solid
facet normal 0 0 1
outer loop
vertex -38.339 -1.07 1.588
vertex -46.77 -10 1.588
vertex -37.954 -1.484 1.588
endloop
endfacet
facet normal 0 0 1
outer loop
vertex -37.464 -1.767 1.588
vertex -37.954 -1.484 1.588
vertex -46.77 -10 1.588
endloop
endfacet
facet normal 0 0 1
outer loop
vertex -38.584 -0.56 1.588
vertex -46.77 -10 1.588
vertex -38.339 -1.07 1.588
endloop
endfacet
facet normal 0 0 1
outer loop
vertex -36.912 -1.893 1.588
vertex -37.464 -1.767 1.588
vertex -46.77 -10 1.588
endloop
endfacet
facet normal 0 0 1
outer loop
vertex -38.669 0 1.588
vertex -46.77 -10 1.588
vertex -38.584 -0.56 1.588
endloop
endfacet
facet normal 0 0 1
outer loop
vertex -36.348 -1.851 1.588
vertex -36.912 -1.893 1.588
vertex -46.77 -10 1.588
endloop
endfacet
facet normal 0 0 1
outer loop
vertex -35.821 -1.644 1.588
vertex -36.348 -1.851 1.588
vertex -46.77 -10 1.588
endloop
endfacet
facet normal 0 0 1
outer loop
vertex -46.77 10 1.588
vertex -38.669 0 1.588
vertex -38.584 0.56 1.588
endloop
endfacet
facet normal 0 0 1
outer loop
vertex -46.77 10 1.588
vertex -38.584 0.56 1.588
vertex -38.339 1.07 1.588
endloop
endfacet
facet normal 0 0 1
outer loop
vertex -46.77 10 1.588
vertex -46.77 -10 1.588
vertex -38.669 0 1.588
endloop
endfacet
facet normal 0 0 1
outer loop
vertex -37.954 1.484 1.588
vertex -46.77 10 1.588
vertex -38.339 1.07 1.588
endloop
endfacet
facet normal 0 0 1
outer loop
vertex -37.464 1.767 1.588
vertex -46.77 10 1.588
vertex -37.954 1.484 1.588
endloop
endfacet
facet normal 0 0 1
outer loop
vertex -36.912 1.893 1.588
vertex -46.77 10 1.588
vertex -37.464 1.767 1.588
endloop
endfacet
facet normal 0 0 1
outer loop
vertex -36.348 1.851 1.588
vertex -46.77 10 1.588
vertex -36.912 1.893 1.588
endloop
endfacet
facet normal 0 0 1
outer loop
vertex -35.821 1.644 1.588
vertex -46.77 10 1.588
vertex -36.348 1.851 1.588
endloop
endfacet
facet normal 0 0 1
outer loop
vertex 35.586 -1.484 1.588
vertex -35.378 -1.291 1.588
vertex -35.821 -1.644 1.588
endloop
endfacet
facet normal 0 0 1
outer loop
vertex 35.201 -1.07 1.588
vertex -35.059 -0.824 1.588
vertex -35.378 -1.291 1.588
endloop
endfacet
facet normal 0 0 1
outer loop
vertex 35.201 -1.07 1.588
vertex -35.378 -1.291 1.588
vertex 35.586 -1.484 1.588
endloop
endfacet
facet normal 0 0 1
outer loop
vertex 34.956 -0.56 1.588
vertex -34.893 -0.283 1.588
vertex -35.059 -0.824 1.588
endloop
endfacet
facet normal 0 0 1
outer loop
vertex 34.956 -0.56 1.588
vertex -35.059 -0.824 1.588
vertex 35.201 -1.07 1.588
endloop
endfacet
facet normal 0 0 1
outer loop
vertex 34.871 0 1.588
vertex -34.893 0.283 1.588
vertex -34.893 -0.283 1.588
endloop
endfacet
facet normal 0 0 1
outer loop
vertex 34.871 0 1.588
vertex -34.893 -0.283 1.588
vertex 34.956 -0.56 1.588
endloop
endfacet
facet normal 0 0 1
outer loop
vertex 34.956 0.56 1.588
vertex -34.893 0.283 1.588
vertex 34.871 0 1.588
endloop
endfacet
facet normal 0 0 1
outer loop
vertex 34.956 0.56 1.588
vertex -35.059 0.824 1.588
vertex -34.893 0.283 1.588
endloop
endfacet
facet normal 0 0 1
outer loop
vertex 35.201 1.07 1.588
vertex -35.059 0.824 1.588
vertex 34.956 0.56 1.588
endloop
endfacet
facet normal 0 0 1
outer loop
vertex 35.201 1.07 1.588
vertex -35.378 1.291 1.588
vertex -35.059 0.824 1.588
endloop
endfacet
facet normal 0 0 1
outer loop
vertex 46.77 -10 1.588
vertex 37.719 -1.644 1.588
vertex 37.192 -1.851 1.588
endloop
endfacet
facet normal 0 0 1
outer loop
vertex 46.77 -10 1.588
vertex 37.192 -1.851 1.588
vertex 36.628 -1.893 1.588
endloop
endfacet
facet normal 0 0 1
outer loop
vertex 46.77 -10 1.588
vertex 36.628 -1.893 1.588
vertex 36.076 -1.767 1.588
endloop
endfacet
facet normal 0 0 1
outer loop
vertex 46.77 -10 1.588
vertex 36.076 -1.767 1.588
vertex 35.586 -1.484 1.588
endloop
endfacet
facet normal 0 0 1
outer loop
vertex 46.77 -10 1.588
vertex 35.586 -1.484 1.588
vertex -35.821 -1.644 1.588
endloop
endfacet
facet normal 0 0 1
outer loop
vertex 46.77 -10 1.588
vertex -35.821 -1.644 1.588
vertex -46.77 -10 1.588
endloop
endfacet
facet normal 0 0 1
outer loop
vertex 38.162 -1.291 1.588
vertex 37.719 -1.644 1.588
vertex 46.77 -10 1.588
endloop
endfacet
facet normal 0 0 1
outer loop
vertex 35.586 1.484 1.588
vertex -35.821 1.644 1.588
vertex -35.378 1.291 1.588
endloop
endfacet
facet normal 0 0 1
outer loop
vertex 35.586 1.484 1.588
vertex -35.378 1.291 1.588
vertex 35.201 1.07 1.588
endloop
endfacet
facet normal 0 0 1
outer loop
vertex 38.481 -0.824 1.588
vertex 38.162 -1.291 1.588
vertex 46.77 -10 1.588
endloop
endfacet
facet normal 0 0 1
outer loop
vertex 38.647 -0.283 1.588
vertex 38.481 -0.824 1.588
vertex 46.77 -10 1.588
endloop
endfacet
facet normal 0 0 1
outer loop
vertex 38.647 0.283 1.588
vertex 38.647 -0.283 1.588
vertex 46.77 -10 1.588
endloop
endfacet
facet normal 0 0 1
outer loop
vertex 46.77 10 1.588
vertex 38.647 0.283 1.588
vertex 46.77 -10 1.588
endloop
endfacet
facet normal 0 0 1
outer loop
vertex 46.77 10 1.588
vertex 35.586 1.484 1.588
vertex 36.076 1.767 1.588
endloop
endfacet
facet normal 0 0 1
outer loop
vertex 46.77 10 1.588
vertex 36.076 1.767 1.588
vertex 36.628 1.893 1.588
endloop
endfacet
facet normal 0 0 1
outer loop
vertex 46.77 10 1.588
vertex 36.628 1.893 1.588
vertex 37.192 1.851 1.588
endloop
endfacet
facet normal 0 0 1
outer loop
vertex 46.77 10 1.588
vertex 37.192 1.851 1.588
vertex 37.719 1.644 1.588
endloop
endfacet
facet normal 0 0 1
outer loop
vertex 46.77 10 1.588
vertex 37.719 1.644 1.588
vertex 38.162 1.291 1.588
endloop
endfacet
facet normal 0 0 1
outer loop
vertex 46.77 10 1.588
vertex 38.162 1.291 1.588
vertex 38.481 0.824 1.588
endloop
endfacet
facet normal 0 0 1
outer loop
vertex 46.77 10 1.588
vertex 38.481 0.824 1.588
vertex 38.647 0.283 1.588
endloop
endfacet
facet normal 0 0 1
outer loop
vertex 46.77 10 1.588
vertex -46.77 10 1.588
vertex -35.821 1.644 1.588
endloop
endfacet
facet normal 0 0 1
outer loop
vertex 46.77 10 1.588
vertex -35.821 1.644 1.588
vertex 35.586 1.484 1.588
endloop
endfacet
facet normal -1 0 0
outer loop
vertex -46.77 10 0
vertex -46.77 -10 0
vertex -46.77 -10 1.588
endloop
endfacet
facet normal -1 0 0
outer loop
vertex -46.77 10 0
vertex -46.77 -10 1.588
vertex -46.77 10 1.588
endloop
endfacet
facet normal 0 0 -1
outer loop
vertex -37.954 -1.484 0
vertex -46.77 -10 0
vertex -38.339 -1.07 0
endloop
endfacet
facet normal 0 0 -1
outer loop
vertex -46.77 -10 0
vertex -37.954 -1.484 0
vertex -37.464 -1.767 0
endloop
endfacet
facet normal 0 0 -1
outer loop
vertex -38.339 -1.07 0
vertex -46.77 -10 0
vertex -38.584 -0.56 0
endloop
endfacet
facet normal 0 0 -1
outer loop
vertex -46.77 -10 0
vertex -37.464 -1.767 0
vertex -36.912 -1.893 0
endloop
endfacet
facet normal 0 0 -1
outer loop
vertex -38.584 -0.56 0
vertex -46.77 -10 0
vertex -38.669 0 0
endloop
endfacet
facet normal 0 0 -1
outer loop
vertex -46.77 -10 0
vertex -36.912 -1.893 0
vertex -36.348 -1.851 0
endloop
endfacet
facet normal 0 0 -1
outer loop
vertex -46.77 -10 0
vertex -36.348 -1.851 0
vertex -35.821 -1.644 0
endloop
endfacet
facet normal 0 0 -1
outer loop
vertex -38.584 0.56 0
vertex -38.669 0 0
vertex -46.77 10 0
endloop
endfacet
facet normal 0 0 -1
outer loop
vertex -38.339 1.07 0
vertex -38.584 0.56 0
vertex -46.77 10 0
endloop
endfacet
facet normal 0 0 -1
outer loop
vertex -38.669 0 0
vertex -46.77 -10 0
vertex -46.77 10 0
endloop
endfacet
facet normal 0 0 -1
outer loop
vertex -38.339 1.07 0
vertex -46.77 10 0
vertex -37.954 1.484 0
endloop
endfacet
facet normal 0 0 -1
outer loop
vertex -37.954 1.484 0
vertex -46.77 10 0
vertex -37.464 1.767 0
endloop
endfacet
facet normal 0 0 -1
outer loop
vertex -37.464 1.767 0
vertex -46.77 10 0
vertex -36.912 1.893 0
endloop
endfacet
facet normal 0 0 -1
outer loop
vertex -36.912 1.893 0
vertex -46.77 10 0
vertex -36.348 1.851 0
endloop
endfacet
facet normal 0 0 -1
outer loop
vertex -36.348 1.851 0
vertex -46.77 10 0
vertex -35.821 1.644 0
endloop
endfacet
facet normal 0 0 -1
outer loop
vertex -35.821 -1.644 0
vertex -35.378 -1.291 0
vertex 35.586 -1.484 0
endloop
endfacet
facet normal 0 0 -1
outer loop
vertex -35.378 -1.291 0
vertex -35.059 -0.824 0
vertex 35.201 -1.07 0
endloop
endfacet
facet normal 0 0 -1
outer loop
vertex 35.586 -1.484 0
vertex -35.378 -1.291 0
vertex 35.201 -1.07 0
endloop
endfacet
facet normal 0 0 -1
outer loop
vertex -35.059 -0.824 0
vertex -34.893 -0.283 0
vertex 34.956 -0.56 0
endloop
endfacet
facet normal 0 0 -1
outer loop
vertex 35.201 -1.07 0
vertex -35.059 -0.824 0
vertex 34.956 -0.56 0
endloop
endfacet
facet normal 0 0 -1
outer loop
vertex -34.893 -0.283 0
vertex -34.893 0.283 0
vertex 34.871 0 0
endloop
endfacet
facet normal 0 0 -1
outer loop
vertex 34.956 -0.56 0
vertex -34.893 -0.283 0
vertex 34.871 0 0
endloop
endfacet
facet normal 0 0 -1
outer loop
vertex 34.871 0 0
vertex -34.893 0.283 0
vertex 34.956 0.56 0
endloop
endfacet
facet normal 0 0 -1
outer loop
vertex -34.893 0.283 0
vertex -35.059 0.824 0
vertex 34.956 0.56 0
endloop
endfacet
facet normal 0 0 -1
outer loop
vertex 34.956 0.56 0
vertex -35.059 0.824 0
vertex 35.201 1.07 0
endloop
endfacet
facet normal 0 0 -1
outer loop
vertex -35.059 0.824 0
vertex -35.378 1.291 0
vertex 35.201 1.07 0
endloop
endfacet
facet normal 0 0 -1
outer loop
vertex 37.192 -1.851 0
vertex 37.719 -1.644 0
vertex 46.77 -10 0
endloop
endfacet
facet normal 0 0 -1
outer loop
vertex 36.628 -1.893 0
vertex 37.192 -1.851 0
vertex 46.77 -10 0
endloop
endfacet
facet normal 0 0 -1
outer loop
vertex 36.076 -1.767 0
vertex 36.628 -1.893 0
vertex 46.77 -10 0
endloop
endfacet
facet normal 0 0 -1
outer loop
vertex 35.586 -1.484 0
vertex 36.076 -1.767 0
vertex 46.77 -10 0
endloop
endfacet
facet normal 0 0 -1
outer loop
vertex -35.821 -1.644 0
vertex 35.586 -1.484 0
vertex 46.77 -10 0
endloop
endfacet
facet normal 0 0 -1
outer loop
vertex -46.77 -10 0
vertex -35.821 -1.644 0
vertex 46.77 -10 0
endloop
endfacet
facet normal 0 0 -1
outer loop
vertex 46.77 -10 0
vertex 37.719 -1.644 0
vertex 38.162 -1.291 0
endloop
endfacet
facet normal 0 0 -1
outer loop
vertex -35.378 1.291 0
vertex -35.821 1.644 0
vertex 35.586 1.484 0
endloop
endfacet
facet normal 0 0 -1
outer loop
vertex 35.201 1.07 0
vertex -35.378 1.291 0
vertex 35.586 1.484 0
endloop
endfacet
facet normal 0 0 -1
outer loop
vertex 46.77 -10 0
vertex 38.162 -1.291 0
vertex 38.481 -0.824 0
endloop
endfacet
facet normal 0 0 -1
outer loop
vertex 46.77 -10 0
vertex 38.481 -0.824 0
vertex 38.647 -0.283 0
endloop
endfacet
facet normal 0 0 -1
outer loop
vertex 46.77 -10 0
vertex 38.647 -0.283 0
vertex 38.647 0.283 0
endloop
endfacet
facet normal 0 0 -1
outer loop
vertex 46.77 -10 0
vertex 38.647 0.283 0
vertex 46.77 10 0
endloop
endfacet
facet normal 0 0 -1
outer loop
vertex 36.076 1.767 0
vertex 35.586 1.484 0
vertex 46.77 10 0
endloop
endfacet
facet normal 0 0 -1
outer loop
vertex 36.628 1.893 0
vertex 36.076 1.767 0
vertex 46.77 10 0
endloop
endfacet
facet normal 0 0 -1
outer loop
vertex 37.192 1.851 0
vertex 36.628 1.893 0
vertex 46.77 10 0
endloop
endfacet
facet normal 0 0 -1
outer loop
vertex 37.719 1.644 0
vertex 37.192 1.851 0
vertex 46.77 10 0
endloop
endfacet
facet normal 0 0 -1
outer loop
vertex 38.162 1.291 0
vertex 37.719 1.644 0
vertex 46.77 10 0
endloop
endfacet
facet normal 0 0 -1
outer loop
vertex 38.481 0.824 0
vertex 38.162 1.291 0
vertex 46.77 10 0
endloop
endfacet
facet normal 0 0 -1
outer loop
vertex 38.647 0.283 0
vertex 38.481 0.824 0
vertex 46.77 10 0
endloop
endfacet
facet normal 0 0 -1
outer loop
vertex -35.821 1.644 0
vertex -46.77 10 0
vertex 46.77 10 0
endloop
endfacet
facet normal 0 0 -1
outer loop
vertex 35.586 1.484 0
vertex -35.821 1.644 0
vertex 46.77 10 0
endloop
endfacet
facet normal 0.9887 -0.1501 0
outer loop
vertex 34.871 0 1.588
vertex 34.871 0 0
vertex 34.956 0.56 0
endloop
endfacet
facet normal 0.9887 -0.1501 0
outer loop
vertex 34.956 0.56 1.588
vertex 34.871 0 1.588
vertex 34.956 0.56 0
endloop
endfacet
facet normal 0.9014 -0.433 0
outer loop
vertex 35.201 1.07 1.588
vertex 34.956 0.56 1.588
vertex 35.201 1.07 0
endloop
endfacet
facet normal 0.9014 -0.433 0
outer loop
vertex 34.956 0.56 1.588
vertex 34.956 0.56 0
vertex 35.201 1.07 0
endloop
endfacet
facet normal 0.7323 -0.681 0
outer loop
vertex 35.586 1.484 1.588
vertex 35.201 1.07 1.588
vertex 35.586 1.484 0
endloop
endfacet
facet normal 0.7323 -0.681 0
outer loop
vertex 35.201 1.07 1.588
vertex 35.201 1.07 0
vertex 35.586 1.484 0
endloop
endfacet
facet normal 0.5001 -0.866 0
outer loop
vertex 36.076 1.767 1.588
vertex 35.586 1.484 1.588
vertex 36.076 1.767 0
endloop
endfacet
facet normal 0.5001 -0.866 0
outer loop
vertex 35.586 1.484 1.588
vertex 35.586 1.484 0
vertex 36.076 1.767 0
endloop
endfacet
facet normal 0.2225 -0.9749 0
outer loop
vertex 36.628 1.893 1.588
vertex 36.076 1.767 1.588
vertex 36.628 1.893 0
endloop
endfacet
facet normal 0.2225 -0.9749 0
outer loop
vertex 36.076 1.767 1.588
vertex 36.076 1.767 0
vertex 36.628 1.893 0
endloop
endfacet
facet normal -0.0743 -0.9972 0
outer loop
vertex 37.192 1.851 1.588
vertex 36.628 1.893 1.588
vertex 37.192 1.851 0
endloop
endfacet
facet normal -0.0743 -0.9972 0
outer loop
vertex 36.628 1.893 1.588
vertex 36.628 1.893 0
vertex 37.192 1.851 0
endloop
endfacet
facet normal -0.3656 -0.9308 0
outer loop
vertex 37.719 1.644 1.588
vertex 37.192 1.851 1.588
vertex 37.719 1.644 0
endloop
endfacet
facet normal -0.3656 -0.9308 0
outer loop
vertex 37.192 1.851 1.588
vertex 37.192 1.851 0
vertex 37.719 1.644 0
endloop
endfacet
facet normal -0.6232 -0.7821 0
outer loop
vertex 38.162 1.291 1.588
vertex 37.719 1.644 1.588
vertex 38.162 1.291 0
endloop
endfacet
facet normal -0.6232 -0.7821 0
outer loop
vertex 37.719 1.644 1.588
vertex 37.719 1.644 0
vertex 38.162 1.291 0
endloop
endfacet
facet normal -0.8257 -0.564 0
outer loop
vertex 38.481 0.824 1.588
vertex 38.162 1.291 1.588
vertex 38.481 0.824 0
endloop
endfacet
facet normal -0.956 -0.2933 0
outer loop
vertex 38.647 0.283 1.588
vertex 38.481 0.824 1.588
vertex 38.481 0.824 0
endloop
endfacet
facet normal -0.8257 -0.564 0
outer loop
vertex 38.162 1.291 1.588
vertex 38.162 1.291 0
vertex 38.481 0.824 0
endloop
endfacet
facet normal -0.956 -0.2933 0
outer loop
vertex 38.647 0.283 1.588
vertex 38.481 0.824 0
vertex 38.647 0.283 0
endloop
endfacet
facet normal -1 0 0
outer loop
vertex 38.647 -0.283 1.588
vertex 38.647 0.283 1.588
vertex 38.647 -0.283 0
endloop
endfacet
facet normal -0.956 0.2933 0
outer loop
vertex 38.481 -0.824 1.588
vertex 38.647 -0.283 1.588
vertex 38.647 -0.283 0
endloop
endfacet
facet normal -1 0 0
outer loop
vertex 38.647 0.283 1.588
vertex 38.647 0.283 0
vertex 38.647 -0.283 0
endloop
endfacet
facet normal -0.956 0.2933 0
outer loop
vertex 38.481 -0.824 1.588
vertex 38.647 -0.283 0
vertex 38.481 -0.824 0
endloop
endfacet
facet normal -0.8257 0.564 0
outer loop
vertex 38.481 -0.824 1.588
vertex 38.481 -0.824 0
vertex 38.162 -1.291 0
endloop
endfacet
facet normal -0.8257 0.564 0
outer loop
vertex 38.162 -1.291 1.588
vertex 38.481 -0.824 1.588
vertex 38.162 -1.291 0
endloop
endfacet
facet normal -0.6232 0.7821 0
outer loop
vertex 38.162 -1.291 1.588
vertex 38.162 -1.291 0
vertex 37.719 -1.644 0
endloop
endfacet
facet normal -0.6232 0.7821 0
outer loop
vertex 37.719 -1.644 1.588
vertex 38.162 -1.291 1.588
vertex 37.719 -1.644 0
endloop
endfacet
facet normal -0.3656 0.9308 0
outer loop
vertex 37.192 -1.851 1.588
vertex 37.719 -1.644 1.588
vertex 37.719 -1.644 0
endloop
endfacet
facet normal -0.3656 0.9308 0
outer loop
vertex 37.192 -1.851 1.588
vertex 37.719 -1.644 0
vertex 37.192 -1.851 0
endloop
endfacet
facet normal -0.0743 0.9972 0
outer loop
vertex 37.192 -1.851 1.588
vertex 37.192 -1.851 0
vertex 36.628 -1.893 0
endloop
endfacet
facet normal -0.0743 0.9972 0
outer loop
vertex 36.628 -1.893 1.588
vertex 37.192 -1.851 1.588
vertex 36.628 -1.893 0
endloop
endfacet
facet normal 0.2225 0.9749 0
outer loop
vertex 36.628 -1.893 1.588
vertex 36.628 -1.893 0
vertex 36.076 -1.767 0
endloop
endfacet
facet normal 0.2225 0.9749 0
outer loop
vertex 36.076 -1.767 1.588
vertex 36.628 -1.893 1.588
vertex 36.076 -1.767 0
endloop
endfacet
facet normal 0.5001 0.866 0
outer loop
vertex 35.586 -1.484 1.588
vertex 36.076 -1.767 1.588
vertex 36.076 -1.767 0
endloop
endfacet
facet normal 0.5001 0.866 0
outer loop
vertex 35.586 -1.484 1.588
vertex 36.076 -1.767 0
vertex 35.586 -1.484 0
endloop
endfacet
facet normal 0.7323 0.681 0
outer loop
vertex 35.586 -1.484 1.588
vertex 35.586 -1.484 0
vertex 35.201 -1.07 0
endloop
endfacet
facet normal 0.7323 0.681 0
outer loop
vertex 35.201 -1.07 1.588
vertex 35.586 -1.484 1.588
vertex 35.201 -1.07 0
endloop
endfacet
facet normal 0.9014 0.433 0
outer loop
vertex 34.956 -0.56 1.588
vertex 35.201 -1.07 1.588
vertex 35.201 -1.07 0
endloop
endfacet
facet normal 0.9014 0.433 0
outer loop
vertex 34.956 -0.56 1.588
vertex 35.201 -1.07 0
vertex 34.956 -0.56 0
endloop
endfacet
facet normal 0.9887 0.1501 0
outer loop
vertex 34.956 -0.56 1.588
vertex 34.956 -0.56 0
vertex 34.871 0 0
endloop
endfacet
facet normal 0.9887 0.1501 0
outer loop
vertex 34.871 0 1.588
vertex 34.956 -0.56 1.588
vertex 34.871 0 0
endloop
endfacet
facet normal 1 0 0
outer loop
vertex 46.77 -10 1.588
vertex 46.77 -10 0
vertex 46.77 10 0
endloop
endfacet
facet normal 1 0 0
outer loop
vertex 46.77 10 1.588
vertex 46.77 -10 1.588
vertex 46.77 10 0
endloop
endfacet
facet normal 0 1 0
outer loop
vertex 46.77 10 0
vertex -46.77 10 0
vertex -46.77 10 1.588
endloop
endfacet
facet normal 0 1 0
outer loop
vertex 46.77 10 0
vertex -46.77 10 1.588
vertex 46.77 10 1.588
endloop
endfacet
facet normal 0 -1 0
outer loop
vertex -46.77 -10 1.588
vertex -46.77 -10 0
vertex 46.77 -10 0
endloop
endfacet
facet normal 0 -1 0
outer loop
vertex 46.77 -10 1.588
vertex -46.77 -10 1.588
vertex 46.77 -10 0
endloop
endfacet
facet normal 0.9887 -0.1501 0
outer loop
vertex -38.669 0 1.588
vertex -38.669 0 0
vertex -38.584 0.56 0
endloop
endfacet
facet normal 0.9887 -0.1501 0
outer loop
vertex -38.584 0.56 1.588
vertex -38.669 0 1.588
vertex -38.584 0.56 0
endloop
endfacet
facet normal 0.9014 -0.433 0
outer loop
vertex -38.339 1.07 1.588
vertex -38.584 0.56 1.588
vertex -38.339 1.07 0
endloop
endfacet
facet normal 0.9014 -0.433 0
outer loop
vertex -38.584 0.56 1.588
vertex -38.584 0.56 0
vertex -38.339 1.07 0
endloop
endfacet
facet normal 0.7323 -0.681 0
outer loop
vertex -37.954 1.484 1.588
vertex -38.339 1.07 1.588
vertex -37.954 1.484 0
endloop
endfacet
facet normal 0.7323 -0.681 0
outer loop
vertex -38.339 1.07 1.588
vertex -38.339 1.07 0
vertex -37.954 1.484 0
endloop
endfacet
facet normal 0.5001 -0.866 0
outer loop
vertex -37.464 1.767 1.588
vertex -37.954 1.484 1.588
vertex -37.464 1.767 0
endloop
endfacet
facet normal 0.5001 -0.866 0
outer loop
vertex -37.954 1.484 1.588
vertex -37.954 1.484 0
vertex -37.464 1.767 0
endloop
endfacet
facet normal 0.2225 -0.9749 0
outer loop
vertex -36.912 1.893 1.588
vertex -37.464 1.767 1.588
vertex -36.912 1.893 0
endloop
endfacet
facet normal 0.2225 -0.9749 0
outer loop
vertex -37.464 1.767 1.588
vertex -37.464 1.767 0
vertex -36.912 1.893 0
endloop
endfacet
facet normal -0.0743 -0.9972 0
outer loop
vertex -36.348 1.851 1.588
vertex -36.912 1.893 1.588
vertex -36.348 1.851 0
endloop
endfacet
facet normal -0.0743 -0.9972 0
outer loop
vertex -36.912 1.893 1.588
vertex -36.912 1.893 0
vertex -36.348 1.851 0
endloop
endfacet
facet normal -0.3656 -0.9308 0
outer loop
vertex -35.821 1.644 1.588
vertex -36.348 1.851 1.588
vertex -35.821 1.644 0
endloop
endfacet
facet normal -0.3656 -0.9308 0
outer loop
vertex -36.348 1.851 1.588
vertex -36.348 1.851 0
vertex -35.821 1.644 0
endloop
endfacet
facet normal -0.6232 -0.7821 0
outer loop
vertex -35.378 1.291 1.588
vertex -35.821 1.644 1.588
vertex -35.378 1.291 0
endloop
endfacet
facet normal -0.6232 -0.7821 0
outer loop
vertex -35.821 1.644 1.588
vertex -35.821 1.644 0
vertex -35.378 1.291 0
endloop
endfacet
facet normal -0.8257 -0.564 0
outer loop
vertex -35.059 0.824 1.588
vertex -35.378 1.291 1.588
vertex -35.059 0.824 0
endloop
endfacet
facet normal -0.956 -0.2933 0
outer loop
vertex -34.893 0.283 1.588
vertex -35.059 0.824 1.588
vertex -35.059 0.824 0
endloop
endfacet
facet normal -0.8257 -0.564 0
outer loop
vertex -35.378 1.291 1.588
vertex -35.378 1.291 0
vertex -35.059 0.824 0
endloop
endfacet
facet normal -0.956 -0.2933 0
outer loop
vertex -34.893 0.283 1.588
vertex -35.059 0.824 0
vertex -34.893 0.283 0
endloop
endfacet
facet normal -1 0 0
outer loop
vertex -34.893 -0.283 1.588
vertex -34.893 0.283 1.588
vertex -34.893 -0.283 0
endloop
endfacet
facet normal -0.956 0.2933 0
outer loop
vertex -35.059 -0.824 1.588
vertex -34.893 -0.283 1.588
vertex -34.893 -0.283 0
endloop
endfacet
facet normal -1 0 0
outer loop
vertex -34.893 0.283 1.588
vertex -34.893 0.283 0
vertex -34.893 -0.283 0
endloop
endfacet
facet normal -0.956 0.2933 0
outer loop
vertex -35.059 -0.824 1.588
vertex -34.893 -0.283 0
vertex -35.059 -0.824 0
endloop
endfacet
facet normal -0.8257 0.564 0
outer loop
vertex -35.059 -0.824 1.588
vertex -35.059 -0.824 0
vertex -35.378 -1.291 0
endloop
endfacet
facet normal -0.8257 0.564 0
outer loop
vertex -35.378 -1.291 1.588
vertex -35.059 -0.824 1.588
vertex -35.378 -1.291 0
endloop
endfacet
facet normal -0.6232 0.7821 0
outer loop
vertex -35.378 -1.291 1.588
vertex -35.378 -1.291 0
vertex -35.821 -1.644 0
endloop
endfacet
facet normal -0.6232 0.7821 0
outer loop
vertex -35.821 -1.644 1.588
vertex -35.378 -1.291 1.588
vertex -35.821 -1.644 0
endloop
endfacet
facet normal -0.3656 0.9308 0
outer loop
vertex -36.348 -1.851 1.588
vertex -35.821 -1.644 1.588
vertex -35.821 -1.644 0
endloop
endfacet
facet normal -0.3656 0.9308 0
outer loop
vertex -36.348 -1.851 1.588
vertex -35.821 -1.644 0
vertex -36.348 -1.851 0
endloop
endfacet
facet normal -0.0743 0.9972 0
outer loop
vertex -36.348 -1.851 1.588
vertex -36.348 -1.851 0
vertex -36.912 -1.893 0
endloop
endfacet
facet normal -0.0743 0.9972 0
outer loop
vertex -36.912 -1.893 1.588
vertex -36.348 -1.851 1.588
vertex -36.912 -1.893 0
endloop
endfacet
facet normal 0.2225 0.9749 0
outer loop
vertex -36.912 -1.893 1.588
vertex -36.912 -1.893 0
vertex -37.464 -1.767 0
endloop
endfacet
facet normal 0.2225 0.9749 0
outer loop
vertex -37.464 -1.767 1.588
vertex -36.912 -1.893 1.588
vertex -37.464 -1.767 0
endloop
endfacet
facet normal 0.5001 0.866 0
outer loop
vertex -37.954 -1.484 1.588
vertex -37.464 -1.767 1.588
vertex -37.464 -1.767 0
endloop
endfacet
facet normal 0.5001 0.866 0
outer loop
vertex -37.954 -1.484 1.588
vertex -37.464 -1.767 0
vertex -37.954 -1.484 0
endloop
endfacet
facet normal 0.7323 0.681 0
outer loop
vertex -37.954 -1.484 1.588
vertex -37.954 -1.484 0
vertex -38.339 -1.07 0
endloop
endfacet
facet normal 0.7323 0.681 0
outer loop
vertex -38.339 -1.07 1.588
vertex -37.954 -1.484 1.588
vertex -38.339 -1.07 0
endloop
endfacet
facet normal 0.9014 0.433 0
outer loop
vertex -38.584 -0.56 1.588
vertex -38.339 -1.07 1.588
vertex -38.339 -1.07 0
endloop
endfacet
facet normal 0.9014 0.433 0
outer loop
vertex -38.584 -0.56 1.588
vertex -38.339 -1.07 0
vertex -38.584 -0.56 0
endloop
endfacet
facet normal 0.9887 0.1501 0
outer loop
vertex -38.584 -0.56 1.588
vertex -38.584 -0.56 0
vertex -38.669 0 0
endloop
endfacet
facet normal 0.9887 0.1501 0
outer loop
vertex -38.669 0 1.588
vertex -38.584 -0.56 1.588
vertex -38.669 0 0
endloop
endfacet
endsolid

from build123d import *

# Parameters (mm, degrees)
SKETCH1_W             = 93.54
SKETCH1_H             = 20
BOSS_EXTRUDE1_DEPTH   = 1.5875
F_6_CLEARANCE_HOLE1_D = 3.7973


with BuildPart() as part:
    # Sketch1 → Boss-Extrude1 (new body)
    with BuildSketch(Plane.XY):
        Rectangle(SKETCH1_W, SKETCH1_H)
    extrude(amount=BOSS_EXTRUDE1_DEPTH)

    # #6 Clearance Hole1 (through all)
    with Locations(Plane.XY.offset(1.5875)):
        with Locations((-36.77, 0), (36.77, 0)):
            Hole(F_6_CLEARANCE_HOLE1_D / 2)


solid = part.part
